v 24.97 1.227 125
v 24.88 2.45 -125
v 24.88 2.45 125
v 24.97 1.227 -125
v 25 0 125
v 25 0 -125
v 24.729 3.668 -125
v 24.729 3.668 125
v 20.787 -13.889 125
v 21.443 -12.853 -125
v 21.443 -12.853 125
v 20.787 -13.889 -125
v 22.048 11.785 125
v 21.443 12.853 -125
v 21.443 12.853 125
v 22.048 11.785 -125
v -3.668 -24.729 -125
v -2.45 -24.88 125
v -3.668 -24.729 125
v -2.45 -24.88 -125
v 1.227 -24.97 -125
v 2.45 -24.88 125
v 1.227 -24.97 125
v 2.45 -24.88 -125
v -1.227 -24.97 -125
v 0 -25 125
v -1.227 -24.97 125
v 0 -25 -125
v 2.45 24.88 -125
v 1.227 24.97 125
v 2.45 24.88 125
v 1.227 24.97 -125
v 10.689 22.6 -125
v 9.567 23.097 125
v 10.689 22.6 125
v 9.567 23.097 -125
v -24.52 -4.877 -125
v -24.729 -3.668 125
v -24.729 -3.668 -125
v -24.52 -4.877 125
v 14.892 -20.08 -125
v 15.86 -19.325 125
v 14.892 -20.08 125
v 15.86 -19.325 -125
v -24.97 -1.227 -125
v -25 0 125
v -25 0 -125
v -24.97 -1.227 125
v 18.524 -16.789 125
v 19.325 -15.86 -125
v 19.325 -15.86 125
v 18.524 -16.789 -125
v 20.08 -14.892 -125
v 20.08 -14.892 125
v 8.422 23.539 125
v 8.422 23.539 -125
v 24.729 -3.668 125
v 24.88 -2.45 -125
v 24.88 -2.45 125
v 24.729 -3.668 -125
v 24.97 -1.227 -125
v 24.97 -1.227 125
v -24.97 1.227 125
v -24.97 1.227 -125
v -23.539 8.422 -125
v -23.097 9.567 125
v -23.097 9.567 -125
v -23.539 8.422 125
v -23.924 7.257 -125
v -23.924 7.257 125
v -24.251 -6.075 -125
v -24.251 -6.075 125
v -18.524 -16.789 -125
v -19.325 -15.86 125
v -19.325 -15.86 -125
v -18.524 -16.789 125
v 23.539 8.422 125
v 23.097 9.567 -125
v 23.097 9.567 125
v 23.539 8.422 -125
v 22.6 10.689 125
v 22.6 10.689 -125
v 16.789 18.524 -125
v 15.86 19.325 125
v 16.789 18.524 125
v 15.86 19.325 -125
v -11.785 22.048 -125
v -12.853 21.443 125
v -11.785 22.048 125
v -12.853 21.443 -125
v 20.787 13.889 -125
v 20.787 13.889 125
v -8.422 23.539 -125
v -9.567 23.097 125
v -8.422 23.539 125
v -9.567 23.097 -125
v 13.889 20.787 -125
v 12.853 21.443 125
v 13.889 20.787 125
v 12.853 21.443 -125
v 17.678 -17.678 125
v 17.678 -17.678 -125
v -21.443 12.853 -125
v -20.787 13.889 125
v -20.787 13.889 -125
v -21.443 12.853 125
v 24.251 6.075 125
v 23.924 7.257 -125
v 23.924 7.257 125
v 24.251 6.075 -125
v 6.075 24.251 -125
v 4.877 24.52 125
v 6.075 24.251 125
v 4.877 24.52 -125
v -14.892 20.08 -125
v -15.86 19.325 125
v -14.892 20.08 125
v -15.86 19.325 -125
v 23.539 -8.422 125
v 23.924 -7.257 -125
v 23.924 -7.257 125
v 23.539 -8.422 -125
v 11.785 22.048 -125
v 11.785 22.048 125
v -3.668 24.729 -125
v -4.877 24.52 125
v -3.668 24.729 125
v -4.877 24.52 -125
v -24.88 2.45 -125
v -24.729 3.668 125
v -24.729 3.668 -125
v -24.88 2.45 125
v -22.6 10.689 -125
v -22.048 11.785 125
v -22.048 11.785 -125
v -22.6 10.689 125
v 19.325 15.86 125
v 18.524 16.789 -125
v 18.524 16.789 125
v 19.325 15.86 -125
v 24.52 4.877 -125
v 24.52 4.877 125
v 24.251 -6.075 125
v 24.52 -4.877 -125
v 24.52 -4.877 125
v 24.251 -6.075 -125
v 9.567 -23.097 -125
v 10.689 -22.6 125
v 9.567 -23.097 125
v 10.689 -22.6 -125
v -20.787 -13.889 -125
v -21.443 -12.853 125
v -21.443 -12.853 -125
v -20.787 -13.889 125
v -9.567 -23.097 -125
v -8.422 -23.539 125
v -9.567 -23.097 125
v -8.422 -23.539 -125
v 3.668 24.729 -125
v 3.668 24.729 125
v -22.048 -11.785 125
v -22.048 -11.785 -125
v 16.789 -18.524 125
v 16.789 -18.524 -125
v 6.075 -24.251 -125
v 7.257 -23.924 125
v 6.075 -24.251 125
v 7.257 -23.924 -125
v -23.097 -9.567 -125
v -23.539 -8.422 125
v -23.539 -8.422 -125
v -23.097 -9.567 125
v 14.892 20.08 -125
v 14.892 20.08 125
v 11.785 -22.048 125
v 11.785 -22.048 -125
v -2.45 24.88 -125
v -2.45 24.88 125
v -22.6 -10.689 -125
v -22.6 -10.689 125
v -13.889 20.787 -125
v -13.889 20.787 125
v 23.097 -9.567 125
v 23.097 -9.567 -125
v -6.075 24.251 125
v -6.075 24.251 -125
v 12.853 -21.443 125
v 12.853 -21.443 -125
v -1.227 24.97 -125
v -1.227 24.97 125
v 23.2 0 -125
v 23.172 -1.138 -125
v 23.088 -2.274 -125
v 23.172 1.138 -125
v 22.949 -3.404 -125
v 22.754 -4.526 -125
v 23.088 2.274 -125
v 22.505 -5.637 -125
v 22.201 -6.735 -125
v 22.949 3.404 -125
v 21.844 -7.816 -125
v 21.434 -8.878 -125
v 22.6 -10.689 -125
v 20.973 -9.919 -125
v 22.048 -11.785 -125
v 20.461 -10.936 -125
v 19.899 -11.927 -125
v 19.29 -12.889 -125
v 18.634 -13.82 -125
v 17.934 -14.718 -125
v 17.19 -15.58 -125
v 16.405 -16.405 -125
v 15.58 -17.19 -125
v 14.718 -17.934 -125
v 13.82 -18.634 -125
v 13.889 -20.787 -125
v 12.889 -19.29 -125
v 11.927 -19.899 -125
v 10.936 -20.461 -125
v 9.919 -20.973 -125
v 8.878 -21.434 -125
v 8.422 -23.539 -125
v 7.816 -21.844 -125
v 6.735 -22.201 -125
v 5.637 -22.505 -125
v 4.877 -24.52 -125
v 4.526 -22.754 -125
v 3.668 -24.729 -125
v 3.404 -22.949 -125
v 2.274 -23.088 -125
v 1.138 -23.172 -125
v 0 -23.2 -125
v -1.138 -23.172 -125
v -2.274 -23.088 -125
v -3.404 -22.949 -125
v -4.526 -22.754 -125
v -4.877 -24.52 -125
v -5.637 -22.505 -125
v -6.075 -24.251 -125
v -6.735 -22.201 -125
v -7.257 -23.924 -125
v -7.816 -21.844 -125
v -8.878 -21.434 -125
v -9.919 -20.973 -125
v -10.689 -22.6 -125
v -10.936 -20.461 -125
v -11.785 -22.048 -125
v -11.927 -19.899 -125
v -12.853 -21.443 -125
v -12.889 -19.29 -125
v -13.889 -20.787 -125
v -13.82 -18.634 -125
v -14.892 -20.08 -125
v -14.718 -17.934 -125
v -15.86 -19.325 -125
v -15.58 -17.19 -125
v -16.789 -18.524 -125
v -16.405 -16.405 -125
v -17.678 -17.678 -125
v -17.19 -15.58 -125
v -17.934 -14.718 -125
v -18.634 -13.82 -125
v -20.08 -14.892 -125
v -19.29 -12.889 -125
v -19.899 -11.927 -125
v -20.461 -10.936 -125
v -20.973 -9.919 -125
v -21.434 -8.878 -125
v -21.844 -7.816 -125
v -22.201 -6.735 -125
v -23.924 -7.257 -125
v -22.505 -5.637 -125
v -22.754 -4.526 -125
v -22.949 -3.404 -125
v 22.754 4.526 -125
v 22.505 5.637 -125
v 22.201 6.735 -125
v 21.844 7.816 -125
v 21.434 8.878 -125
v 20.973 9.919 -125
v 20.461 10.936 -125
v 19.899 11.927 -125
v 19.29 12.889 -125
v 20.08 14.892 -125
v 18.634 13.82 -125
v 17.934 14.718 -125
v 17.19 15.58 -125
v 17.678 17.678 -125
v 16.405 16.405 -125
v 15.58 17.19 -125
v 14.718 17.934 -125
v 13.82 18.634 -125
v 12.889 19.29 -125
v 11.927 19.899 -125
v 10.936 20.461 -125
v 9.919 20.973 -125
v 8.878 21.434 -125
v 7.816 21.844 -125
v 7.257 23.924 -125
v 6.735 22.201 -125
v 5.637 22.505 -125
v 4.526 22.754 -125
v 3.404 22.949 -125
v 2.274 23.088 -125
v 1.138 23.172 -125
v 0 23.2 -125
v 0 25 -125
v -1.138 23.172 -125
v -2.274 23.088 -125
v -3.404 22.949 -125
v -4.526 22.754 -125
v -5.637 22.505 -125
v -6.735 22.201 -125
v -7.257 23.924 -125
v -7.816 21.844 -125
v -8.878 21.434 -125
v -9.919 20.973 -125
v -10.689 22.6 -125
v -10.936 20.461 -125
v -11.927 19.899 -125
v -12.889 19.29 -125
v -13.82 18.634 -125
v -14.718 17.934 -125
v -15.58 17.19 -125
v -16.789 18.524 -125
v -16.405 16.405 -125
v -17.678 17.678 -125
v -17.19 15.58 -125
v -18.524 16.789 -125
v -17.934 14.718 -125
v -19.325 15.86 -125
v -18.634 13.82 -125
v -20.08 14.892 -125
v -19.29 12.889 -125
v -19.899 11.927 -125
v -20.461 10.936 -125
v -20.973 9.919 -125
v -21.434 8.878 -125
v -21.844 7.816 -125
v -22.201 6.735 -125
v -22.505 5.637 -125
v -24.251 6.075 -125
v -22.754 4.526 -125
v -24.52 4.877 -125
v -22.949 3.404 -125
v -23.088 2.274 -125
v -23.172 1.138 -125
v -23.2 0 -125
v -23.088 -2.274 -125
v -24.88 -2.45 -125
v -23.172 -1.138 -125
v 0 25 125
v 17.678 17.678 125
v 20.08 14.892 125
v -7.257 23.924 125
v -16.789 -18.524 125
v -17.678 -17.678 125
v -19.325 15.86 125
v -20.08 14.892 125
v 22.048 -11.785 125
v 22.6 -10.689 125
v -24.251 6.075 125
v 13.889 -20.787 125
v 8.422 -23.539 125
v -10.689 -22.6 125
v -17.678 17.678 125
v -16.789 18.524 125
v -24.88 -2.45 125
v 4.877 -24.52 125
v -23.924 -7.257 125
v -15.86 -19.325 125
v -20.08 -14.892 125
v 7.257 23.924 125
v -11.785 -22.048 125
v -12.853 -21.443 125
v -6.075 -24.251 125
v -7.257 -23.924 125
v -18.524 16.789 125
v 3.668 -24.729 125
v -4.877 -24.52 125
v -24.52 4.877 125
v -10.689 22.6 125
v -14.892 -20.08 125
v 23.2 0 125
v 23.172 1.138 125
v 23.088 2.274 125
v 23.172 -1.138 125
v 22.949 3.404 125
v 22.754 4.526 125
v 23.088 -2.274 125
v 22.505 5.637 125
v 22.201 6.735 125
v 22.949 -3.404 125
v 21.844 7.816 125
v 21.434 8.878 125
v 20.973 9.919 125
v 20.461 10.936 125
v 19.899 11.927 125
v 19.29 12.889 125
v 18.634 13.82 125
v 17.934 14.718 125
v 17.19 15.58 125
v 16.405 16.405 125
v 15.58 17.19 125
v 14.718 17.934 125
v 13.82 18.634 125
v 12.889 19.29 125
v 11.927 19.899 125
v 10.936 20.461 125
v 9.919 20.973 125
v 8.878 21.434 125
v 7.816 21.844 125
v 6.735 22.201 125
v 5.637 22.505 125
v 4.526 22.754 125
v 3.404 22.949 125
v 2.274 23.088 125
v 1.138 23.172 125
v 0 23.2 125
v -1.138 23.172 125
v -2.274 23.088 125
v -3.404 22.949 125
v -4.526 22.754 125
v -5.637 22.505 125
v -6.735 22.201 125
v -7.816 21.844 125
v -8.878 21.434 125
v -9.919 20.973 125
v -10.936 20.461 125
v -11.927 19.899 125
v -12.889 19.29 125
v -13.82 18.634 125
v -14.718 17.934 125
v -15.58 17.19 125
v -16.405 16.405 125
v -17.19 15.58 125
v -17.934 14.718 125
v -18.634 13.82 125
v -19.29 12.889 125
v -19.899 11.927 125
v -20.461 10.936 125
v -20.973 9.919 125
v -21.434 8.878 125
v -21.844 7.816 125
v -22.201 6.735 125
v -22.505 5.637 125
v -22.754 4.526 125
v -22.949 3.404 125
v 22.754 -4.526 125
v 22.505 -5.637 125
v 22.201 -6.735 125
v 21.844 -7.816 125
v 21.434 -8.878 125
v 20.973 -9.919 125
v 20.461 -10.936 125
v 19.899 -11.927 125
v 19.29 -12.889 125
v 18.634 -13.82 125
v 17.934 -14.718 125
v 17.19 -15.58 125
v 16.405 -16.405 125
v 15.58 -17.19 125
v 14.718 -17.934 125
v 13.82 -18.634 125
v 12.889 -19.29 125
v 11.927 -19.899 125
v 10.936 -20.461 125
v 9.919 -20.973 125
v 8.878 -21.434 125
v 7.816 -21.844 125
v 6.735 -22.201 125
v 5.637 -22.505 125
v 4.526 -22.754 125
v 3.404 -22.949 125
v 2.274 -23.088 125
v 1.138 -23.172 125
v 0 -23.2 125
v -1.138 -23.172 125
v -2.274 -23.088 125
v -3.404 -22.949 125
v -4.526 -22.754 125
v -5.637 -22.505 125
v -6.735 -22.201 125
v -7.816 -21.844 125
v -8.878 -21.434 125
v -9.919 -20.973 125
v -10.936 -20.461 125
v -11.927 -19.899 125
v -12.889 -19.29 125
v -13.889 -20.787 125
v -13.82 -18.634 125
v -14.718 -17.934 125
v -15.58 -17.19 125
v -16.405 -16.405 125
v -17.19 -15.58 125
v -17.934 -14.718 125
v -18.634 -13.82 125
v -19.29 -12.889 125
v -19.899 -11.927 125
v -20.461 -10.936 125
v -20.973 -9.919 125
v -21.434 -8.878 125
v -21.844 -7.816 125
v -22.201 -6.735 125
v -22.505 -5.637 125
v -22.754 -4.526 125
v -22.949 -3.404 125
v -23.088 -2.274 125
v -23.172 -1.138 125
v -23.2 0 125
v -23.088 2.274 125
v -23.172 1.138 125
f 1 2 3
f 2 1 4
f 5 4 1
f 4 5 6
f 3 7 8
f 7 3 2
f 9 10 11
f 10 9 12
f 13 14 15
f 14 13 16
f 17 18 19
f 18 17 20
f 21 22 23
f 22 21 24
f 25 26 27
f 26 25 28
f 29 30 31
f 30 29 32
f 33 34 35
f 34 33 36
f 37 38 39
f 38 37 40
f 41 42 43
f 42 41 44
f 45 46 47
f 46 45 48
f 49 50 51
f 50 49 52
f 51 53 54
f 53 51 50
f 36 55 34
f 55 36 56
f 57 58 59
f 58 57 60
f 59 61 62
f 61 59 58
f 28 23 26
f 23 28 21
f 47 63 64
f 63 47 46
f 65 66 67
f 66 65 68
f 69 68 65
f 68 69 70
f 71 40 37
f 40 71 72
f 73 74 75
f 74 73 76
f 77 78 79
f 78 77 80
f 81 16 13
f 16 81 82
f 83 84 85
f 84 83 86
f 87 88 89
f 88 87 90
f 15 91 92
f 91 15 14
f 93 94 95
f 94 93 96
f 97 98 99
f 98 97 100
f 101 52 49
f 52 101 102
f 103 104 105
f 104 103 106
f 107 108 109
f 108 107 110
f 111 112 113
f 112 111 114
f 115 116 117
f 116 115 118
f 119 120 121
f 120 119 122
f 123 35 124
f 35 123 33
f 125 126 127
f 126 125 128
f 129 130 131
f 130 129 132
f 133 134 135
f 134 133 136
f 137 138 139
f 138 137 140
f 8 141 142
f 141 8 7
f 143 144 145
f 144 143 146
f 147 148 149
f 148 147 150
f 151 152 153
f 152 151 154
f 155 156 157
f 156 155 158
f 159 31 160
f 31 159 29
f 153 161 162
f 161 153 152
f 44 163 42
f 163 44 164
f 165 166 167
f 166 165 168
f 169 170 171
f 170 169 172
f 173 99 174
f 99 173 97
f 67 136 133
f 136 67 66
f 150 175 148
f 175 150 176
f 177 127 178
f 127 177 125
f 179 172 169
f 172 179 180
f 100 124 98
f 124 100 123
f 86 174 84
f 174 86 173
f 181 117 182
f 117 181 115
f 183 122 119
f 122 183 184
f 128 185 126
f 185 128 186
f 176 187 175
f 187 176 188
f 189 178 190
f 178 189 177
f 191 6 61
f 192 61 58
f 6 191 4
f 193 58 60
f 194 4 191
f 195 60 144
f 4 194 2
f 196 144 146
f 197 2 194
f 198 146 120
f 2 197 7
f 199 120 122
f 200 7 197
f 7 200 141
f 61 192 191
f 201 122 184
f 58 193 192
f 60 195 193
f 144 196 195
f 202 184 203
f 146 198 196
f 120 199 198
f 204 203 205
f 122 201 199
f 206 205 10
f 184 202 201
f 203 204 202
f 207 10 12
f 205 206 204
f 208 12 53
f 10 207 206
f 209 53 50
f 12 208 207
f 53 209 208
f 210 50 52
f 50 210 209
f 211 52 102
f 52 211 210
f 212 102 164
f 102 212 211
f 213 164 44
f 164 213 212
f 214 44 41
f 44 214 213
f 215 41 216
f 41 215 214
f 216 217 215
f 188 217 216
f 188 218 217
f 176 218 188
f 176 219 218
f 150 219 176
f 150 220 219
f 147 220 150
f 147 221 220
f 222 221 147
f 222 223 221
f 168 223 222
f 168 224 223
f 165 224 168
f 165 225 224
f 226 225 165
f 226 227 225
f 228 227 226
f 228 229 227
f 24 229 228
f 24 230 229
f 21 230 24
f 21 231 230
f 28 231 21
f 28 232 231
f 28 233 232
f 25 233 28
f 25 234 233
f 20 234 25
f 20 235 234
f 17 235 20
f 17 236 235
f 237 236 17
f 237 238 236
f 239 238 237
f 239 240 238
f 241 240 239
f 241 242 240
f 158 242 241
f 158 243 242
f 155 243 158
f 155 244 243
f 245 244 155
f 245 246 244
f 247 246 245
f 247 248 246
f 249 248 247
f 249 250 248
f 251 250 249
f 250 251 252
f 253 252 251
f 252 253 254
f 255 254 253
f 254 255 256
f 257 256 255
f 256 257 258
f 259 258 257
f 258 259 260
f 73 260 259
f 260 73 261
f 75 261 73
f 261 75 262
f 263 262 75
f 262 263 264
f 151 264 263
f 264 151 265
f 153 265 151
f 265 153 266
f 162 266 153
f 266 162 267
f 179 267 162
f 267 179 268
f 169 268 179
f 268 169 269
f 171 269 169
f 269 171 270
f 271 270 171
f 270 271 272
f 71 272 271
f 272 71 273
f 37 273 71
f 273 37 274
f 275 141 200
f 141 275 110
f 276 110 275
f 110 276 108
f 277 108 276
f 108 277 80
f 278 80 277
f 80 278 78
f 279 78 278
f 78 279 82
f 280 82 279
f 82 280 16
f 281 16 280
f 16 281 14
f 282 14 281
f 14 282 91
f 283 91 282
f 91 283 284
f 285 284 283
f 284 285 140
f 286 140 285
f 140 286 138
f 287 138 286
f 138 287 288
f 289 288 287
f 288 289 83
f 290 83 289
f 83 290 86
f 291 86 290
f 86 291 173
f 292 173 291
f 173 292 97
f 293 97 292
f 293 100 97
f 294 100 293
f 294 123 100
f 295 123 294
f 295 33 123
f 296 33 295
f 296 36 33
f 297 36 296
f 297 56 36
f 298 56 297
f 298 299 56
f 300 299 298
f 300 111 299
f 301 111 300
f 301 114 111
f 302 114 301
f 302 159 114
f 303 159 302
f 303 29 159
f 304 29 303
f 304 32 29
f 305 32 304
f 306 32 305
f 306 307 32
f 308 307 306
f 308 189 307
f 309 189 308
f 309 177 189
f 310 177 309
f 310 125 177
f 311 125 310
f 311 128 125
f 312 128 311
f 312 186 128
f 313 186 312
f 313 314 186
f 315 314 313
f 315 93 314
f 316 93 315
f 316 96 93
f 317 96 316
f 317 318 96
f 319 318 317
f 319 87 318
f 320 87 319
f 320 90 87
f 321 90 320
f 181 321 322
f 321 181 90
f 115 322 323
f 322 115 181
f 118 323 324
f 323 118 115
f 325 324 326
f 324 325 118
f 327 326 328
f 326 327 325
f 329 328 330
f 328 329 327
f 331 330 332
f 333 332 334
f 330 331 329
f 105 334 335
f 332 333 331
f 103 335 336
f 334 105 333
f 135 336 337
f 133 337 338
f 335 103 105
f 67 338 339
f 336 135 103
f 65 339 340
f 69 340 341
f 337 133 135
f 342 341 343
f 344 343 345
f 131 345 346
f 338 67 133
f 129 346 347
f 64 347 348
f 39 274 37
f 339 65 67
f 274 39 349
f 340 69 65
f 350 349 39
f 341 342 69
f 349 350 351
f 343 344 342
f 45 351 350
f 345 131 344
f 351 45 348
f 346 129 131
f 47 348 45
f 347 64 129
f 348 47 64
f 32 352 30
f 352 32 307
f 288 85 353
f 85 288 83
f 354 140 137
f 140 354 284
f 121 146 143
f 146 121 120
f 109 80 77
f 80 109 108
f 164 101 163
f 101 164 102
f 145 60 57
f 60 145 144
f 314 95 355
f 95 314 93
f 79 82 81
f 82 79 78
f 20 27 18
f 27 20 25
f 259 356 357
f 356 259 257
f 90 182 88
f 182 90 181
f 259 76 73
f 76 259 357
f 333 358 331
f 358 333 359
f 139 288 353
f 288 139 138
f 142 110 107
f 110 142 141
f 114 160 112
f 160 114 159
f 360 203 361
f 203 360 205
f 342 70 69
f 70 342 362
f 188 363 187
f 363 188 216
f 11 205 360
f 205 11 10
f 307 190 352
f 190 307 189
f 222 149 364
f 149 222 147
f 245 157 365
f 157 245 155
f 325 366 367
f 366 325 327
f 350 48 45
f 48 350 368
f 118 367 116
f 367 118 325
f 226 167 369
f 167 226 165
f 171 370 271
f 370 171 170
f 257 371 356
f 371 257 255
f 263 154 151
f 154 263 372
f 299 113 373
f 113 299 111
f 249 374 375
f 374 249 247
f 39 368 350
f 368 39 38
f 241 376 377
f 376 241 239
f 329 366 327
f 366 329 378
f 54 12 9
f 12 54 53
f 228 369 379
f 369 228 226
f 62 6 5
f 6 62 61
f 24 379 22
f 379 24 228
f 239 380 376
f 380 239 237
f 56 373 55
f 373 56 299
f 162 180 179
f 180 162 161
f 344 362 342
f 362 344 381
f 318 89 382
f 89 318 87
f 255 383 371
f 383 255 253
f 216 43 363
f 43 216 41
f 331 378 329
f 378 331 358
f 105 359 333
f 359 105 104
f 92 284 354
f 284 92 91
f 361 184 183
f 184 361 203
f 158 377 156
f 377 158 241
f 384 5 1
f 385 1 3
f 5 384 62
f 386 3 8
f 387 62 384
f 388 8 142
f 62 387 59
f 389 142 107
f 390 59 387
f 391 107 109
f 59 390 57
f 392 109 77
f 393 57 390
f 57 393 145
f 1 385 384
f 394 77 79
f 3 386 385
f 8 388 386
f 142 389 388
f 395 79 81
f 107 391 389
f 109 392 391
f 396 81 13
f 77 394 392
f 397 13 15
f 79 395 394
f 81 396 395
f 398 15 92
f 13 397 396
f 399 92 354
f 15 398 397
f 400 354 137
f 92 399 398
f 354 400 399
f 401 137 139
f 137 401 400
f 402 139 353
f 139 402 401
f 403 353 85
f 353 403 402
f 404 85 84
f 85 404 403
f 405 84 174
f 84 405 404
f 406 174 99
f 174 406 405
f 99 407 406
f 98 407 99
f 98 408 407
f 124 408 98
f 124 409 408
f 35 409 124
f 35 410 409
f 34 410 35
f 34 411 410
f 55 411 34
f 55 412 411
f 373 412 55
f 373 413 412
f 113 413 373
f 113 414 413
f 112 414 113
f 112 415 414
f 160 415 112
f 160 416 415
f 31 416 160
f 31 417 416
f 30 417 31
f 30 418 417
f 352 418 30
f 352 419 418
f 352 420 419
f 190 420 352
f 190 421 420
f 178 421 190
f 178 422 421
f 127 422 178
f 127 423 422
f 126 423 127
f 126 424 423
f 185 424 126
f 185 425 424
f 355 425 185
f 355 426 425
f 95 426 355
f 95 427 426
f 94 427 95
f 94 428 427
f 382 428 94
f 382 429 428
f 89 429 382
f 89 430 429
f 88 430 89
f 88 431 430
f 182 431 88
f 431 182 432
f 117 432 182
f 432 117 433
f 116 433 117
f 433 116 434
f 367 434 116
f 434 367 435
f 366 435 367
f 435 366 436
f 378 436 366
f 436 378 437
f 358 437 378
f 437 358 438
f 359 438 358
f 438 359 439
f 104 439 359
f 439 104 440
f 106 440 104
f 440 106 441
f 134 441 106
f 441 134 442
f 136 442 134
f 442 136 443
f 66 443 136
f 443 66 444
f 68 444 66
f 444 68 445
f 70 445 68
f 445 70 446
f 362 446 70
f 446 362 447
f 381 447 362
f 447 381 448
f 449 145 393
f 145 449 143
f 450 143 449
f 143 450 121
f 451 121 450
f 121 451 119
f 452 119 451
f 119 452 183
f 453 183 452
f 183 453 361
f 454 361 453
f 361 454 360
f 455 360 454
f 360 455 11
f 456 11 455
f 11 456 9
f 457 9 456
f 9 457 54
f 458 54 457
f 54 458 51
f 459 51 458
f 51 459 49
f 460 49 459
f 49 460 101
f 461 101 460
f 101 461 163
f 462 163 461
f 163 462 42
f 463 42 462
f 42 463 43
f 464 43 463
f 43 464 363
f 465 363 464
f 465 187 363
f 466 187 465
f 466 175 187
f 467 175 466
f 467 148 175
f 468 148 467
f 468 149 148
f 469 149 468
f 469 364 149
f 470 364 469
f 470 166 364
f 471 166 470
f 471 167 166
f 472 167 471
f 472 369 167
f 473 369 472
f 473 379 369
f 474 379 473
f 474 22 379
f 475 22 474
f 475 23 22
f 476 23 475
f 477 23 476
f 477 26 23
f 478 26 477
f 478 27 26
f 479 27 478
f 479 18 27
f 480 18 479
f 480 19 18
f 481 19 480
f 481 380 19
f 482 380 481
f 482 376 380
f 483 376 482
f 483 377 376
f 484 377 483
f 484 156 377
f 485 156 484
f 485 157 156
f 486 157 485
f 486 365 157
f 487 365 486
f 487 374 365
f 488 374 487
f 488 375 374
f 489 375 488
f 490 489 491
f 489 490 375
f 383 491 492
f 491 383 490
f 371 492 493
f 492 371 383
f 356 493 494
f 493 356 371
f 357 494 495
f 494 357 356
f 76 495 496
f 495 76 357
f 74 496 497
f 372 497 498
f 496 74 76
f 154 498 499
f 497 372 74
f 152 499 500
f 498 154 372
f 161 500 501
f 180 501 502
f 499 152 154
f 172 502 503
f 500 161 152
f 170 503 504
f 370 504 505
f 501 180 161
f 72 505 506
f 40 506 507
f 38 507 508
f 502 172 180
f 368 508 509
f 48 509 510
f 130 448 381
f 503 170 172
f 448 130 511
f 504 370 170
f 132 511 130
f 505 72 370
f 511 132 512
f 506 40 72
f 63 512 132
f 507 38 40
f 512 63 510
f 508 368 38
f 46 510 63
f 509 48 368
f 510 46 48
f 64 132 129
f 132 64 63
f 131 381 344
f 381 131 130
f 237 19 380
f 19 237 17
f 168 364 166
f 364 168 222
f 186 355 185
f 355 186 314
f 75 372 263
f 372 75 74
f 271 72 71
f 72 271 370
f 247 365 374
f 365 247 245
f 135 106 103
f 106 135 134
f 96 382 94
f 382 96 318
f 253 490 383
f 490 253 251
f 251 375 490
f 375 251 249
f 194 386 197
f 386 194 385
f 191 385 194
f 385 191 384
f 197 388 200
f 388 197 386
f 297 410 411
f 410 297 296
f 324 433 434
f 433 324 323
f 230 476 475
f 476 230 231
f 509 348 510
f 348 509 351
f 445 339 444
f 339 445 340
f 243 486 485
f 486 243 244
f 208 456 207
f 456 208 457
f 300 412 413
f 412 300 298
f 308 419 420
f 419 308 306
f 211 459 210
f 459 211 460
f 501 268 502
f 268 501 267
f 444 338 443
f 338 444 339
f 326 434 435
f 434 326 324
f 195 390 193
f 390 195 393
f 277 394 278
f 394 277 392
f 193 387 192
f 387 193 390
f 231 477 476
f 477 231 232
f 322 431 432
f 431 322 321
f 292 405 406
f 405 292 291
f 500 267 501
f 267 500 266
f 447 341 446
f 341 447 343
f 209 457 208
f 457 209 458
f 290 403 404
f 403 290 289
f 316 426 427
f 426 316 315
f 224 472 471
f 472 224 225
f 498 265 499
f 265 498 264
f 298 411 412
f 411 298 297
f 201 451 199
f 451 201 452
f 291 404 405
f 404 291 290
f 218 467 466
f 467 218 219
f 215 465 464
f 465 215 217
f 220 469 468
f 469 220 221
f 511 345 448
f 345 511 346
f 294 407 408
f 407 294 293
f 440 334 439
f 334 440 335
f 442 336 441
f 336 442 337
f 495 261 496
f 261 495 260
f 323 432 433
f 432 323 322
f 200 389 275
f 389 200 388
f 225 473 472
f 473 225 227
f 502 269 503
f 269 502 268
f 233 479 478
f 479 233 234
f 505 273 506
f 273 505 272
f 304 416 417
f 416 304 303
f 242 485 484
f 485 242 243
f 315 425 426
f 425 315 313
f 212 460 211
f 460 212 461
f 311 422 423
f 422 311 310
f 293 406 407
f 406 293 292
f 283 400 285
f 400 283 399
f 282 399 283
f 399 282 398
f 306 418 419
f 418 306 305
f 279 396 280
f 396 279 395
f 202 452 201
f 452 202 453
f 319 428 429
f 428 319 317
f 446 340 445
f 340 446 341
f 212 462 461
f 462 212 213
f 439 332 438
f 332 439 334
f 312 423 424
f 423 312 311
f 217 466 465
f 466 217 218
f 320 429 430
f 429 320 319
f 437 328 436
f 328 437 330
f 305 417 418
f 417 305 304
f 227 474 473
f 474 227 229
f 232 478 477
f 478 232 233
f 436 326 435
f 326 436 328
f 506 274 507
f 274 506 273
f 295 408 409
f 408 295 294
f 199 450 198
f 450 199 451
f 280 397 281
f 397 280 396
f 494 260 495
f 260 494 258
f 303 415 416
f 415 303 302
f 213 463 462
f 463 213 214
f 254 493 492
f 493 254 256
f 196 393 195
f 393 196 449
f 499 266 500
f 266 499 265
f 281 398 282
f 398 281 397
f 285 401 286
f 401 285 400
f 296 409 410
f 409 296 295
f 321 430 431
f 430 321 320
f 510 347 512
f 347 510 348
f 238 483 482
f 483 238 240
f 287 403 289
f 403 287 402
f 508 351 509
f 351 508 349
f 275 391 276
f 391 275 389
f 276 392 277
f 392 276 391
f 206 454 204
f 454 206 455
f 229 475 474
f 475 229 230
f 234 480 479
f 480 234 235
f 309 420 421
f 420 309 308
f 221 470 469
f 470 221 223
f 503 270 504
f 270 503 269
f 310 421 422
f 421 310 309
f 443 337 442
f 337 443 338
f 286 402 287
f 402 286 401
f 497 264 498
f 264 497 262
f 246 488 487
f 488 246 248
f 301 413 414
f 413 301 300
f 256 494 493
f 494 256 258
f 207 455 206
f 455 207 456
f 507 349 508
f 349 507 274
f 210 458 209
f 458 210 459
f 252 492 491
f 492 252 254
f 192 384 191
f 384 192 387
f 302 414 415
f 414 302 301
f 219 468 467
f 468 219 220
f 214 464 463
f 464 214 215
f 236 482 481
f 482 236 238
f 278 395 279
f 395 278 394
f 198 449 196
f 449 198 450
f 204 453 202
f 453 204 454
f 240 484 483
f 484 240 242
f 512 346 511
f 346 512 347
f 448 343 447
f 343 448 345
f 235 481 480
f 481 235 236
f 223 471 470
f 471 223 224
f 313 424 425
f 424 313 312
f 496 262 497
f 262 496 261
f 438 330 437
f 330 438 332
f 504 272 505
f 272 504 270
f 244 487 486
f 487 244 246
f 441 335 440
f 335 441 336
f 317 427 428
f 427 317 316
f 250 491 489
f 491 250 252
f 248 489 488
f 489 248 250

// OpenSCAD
// HT 50 pipe 250 mm

outer_diameter = 50;      // mm
wall_thickness = 1.8;     // mm
length = 250;             // mm
eps = 0.2;                // overlap to avoid coplanar faces
$fn = 128;

inner_diameter = outer_diameter - 2*wall_thickness;

module ht_pipe_segment() {
    difference() {
        // Centered outer solid for reliable viewing/orientation
        cylinder(h=length, d=outer_diameter, center=true);

        // Inner void: slightly longer so it fully subtracts through both ends
        cylinder(h=length + 2*eps, d=inner_diameter, center=true);
    }
}

ht_pipe_segment();
